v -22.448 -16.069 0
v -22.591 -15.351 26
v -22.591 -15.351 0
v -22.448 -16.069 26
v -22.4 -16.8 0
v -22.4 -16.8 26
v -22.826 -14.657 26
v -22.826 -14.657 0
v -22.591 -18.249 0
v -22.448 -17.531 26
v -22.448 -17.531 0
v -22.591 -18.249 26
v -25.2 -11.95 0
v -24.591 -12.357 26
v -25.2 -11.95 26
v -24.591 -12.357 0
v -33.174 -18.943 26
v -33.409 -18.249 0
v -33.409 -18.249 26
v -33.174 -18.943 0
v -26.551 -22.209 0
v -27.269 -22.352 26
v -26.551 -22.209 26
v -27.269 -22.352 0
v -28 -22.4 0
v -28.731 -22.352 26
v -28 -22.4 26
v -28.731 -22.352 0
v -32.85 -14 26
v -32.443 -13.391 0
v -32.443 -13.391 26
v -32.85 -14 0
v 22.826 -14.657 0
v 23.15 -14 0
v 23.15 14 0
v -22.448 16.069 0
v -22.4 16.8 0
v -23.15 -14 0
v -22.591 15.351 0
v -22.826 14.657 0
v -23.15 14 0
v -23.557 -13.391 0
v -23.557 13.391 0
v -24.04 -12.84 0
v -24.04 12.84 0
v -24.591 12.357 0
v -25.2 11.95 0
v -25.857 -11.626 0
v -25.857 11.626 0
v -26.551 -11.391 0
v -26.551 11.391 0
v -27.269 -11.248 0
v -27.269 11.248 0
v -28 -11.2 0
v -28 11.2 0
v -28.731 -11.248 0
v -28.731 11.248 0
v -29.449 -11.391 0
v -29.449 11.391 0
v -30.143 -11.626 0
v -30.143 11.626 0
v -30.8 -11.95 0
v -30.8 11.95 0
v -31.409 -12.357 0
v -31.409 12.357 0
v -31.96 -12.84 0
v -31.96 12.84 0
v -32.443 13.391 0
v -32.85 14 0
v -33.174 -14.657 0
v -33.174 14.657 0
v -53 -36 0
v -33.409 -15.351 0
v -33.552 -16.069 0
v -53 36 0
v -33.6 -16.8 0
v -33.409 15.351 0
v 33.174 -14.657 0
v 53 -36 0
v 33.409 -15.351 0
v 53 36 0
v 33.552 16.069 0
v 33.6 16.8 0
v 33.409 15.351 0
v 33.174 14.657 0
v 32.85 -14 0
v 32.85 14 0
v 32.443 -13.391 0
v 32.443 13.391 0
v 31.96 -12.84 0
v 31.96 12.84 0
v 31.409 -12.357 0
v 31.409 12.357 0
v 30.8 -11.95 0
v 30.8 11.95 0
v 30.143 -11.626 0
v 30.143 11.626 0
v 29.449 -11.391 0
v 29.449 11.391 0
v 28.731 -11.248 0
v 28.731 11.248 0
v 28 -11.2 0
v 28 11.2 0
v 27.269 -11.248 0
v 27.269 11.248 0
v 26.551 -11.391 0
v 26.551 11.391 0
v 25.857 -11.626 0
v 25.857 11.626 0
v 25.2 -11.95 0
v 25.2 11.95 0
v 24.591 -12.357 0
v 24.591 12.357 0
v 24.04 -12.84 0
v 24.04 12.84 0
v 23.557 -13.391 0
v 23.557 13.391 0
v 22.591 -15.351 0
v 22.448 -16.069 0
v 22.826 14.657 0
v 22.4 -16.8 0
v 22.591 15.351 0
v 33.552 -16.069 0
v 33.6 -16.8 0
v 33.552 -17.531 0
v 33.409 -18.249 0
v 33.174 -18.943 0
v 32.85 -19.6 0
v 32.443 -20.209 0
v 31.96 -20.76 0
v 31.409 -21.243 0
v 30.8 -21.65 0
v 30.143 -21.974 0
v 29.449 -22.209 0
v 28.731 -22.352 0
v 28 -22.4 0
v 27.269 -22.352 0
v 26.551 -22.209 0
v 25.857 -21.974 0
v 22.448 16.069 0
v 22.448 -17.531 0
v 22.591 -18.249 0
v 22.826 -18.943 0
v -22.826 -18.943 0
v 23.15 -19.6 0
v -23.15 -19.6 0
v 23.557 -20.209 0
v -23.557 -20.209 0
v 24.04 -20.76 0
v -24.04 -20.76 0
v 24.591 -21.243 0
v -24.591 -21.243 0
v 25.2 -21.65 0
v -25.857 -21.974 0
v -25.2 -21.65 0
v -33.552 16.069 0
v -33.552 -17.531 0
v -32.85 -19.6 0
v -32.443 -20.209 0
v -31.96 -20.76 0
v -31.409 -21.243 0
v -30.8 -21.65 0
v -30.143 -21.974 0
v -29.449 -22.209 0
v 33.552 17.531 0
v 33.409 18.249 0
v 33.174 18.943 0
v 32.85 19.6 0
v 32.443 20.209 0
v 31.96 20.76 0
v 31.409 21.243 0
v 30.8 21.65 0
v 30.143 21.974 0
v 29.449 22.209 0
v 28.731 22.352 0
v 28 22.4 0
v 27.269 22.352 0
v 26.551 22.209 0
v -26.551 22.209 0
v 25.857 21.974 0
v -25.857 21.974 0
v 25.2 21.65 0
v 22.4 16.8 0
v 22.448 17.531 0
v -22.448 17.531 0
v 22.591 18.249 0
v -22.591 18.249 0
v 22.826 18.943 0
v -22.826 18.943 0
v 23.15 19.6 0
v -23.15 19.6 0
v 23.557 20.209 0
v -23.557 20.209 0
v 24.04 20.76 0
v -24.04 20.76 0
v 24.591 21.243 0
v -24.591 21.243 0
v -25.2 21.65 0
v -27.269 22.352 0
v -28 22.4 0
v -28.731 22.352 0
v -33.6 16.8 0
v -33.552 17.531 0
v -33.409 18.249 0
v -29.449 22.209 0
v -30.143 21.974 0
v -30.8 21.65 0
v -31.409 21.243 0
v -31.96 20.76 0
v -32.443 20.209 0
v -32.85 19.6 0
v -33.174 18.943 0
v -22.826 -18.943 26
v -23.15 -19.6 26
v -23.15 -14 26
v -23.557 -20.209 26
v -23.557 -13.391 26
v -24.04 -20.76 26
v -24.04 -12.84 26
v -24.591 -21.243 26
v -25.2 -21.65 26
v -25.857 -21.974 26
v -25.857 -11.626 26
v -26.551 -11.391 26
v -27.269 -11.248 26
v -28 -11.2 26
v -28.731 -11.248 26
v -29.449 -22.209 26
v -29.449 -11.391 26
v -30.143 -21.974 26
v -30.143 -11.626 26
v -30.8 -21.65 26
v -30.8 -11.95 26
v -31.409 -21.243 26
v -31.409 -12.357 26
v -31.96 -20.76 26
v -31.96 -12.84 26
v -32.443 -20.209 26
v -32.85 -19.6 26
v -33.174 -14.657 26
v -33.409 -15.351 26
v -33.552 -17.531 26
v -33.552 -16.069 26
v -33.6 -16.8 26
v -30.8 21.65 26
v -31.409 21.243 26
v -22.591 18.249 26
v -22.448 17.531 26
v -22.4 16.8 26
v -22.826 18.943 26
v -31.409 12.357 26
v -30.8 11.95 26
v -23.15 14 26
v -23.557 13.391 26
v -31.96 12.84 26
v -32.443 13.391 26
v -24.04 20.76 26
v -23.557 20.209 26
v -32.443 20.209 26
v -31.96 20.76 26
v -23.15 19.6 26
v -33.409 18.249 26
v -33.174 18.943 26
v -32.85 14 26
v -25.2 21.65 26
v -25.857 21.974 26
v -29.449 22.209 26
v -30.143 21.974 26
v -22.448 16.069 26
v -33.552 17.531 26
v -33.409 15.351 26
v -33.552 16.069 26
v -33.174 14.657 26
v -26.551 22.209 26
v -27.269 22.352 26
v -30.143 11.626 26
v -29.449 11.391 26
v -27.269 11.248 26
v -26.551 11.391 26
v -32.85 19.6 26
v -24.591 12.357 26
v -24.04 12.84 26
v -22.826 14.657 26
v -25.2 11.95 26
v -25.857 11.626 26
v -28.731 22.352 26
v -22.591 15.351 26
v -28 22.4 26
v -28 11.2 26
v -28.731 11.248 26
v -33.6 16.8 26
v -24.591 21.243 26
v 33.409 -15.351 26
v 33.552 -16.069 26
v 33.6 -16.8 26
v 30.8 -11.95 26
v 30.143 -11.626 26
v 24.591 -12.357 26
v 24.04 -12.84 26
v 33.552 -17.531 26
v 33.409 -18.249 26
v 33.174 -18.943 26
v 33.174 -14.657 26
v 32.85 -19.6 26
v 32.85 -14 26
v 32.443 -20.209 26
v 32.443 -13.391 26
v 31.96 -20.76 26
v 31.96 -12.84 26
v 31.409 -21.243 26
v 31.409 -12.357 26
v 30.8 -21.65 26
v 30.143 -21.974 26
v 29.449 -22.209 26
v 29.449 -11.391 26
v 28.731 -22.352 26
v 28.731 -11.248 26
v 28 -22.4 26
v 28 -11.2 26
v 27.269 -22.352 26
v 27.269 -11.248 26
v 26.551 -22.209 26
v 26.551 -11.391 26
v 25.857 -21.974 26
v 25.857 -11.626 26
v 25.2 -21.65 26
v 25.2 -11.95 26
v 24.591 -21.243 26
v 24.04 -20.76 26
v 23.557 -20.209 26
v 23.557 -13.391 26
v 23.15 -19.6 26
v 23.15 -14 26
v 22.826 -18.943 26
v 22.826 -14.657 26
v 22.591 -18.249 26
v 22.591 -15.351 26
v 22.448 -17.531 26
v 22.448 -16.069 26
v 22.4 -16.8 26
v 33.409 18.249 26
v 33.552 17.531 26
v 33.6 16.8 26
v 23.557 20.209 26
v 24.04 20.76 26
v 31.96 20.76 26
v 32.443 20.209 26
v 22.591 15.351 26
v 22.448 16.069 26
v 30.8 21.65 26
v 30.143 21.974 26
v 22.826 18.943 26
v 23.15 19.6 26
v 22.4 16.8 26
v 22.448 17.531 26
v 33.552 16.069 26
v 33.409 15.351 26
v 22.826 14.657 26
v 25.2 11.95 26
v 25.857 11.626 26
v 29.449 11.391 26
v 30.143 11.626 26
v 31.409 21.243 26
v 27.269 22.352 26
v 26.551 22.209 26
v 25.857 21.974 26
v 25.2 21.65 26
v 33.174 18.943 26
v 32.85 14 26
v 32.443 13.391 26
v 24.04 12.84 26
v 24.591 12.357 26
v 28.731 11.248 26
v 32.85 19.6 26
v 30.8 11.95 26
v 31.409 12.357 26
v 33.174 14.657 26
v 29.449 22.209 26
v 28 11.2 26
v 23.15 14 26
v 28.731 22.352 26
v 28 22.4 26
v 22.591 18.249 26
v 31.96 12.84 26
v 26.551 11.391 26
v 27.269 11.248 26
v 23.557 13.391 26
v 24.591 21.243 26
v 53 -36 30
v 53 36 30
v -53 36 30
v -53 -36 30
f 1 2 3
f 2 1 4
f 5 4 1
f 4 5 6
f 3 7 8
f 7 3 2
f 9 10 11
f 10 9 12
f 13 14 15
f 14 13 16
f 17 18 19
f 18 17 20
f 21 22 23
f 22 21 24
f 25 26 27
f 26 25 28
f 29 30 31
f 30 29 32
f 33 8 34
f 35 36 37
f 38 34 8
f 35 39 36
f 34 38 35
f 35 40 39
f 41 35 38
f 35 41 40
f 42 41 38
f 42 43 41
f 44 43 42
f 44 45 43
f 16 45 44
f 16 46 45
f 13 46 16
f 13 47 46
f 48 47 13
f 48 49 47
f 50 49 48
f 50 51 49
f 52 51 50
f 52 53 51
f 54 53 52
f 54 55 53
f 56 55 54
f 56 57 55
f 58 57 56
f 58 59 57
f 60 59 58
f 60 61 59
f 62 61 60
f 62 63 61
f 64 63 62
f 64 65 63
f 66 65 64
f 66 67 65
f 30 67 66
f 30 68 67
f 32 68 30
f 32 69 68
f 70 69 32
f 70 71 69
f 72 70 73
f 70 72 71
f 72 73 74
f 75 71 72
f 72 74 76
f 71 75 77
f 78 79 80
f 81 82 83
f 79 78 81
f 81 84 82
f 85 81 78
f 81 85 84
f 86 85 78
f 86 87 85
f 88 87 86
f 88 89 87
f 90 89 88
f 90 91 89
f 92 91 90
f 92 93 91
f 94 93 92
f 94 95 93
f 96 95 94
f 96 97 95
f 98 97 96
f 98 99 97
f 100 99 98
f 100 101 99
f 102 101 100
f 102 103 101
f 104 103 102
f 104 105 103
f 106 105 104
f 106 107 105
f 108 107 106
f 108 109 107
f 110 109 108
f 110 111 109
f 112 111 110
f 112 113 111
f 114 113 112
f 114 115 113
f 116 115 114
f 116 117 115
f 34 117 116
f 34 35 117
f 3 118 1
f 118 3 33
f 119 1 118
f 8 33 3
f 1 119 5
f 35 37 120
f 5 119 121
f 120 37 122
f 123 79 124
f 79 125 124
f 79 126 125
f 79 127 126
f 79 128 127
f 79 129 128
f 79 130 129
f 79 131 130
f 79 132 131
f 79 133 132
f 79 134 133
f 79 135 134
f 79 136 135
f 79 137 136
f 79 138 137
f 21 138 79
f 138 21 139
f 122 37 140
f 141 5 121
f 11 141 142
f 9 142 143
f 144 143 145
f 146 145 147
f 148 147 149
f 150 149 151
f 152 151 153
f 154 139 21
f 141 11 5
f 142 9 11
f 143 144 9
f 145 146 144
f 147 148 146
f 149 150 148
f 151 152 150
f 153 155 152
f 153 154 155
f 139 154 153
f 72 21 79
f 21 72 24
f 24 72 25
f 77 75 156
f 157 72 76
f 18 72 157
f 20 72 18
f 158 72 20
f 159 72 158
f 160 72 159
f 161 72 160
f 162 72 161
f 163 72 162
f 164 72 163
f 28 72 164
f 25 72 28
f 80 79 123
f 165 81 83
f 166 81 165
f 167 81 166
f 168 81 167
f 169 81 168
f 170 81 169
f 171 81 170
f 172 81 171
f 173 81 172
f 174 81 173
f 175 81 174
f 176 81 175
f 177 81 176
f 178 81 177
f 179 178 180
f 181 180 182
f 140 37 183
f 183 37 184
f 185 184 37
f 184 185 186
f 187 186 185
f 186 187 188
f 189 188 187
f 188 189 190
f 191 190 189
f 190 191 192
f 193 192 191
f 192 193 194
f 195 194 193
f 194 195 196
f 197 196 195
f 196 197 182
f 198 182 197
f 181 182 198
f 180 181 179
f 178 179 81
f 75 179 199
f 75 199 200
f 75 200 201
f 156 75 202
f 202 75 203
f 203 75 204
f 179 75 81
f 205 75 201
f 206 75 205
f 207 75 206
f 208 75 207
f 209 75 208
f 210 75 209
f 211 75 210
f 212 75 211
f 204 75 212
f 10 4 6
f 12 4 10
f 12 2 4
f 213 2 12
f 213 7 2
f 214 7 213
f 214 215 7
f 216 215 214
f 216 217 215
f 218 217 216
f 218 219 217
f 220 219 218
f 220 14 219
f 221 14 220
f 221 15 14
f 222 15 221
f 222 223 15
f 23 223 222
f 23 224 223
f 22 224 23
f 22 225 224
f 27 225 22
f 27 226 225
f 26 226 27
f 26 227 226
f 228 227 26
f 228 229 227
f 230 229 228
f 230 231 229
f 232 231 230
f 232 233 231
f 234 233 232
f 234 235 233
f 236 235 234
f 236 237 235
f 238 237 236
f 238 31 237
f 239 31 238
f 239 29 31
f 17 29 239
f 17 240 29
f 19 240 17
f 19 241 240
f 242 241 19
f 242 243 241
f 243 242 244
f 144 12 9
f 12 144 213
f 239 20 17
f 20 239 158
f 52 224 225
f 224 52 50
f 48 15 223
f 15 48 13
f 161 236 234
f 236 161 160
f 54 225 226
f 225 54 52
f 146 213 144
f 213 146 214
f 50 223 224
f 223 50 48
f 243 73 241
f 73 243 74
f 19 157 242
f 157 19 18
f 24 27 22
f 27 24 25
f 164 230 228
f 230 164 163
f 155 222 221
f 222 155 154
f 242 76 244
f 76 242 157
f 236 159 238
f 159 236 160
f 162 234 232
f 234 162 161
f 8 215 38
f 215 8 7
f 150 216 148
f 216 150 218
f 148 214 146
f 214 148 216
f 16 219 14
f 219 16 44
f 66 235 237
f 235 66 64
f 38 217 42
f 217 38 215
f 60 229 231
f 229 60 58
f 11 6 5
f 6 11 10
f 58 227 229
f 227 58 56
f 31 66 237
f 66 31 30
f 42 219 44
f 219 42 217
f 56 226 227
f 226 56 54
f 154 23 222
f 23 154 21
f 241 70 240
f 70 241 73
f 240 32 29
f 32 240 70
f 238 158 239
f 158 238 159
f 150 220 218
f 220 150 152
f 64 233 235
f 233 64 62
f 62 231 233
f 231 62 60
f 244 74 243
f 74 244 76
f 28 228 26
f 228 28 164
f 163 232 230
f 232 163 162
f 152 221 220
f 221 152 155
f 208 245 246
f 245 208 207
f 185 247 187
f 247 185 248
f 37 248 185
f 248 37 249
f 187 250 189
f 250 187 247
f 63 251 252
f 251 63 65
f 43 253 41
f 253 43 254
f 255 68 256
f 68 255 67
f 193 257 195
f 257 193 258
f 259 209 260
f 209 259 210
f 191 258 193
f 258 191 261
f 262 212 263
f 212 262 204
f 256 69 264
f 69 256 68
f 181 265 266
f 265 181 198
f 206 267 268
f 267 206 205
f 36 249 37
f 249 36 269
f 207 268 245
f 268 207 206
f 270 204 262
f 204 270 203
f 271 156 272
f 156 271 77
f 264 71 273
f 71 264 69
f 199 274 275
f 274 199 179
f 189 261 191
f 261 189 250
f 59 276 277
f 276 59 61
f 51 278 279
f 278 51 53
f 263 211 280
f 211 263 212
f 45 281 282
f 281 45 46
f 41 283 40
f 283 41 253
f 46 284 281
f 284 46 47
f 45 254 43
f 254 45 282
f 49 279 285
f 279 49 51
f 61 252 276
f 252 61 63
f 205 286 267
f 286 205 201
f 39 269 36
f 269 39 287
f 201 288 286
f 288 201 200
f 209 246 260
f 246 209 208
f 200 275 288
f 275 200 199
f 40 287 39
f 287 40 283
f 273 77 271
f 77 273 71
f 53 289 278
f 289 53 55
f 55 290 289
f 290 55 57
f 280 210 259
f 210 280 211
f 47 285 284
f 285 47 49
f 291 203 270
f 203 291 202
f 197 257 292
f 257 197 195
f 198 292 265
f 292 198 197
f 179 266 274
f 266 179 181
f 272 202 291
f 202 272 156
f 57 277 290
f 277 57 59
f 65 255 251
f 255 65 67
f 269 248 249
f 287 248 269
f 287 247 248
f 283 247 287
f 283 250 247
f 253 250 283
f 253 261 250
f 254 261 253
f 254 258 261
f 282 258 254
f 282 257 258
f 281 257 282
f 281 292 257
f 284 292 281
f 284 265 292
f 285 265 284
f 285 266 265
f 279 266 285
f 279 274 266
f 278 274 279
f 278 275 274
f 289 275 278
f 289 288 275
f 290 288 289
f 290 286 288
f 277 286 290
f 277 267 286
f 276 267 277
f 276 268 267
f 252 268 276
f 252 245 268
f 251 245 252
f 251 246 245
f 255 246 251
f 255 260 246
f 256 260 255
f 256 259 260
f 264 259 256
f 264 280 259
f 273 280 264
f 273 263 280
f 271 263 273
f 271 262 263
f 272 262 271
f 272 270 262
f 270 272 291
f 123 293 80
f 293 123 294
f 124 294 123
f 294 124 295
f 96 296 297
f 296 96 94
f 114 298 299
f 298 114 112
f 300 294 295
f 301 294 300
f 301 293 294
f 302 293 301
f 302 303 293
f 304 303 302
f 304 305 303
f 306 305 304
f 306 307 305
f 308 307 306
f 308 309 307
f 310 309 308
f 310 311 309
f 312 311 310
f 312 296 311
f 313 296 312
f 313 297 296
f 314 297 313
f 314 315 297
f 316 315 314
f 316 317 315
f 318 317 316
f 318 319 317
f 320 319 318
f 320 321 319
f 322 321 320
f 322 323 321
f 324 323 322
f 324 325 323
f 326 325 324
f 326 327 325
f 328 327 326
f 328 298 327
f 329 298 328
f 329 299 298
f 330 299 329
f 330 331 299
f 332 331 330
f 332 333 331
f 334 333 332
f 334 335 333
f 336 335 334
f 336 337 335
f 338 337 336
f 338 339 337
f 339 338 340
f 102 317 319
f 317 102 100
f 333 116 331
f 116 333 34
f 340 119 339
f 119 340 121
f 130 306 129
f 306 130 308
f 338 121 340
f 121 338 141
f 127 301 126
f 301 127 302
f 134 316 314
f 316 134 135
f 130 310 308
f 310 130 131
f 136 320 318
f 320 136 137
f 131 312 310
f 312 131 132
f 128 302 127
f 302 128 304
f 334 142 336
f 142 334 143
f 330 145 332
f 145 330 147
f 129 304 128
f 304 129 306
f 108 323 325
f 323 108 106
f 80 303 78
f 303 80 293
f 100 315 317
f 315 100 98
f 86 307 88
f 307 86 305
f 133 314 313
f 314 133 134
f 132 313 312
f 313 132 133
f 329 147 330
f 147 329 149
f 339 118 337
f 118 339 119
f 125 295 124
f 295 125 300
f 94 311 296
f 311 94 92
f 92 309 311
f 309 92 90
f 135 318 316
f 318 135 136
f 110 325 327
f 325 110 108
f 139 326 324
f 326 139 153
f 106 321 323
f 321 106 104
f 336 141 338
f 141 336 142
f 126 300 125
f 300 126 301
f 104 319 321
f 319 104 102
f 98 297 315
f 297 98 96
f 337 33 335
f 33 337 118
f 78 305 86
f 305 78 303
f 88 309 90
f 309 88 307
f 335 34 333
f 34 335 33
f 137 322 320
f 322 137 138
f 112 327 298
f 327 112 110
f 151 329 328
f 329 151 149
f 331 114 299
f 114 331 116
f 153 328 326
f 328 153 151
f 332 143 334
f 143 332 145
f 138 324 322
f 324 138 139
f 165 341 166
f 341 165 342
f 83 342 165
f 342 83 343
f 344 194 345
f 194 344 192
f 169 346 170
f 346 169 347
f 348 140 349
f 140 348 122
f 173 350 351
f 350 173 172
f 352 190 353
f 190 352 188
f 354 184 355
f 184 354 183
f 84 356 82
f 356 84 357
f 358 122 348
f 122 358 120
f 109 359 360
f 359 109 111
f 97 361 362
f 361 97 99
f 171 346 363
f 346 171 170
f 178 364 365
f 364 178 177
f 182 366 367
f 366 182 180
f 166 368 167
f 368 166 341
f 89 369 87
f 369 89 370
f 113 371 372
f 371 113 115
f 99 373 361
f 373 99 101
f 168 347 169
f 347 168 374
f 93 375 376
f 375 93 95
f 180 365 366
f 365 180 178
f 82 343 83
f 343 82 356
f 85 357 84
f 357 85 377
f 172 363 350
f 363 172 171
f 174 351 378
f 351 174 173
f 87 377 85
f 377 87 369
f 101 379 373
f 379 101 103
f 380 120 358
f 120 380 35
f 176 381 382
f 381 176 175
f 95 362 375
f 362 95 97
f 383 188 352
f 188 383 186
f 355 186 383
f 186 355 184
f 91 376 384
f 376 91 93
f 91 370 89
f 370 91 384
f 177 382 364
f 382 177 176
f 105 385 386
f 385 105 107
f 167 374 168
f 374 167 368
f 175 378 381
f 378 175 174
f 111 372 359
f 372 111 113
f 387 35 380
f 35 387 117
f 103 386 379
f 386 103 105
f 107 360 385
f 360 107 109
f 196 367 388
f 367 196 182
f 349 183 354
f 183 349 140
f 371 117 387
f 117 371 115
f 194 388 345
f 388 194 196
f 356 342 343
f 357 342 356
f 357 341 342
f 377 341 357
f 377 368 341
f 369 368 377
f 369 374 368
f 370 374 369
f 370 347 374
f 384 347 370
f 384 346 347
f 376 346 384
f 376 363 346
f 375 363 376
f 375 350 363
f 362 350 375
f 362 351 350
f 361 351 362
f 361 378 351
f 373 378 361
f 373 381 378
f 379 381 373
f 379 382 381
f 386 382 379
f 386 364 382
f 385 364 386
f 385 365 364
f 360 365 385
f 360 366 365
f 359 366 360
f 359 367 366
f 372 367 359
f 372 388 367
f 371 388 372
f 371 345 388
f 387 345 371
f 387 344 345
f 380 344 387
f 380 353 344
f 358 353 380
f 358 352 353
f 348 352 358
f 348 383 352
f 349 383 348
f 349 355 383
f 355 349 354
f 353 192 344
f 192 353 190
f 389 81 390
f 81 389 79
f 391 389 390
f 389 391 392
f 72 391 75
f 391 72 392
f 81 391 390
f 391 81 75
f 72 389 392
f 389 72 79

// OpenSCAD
// Bench rack for 1.5 mL microcentrifuge tubes - a solid rectangular block with a regular square
// grid of vertical through holes. NOVEL general part (a generic pegboard/rack block).
//

cols   = 6;
rows   = 4;
d      = 11.2;
reach  = 25;
L      = 106;
W      = 72;
H      = 30;
floor  = 5;

$fn = 48;

pitch_x = cols > 0 ? d * (cols - 1) : 0;
pitch_y = rows > 0 ? d * (rows - 1) : 0;

size_x = cols > 0 ? pitch_x + d : L;
size_y = rows > 0 ? pitch_y + d : W;
size_z = H;

difference() {
    translate([-L / 2, -W / 2, 0]) cube([L, W, H]);
    for (i = [0 : cols - 1], j = [0 : rows - 1])
        translate([-(size_x / 2 - d / 2) + i * pitch_x, -(size_y / 2 - d / 2) + j * pitch_y, 0])
            cylinder(h = H - floor + 1, d = d);
}
